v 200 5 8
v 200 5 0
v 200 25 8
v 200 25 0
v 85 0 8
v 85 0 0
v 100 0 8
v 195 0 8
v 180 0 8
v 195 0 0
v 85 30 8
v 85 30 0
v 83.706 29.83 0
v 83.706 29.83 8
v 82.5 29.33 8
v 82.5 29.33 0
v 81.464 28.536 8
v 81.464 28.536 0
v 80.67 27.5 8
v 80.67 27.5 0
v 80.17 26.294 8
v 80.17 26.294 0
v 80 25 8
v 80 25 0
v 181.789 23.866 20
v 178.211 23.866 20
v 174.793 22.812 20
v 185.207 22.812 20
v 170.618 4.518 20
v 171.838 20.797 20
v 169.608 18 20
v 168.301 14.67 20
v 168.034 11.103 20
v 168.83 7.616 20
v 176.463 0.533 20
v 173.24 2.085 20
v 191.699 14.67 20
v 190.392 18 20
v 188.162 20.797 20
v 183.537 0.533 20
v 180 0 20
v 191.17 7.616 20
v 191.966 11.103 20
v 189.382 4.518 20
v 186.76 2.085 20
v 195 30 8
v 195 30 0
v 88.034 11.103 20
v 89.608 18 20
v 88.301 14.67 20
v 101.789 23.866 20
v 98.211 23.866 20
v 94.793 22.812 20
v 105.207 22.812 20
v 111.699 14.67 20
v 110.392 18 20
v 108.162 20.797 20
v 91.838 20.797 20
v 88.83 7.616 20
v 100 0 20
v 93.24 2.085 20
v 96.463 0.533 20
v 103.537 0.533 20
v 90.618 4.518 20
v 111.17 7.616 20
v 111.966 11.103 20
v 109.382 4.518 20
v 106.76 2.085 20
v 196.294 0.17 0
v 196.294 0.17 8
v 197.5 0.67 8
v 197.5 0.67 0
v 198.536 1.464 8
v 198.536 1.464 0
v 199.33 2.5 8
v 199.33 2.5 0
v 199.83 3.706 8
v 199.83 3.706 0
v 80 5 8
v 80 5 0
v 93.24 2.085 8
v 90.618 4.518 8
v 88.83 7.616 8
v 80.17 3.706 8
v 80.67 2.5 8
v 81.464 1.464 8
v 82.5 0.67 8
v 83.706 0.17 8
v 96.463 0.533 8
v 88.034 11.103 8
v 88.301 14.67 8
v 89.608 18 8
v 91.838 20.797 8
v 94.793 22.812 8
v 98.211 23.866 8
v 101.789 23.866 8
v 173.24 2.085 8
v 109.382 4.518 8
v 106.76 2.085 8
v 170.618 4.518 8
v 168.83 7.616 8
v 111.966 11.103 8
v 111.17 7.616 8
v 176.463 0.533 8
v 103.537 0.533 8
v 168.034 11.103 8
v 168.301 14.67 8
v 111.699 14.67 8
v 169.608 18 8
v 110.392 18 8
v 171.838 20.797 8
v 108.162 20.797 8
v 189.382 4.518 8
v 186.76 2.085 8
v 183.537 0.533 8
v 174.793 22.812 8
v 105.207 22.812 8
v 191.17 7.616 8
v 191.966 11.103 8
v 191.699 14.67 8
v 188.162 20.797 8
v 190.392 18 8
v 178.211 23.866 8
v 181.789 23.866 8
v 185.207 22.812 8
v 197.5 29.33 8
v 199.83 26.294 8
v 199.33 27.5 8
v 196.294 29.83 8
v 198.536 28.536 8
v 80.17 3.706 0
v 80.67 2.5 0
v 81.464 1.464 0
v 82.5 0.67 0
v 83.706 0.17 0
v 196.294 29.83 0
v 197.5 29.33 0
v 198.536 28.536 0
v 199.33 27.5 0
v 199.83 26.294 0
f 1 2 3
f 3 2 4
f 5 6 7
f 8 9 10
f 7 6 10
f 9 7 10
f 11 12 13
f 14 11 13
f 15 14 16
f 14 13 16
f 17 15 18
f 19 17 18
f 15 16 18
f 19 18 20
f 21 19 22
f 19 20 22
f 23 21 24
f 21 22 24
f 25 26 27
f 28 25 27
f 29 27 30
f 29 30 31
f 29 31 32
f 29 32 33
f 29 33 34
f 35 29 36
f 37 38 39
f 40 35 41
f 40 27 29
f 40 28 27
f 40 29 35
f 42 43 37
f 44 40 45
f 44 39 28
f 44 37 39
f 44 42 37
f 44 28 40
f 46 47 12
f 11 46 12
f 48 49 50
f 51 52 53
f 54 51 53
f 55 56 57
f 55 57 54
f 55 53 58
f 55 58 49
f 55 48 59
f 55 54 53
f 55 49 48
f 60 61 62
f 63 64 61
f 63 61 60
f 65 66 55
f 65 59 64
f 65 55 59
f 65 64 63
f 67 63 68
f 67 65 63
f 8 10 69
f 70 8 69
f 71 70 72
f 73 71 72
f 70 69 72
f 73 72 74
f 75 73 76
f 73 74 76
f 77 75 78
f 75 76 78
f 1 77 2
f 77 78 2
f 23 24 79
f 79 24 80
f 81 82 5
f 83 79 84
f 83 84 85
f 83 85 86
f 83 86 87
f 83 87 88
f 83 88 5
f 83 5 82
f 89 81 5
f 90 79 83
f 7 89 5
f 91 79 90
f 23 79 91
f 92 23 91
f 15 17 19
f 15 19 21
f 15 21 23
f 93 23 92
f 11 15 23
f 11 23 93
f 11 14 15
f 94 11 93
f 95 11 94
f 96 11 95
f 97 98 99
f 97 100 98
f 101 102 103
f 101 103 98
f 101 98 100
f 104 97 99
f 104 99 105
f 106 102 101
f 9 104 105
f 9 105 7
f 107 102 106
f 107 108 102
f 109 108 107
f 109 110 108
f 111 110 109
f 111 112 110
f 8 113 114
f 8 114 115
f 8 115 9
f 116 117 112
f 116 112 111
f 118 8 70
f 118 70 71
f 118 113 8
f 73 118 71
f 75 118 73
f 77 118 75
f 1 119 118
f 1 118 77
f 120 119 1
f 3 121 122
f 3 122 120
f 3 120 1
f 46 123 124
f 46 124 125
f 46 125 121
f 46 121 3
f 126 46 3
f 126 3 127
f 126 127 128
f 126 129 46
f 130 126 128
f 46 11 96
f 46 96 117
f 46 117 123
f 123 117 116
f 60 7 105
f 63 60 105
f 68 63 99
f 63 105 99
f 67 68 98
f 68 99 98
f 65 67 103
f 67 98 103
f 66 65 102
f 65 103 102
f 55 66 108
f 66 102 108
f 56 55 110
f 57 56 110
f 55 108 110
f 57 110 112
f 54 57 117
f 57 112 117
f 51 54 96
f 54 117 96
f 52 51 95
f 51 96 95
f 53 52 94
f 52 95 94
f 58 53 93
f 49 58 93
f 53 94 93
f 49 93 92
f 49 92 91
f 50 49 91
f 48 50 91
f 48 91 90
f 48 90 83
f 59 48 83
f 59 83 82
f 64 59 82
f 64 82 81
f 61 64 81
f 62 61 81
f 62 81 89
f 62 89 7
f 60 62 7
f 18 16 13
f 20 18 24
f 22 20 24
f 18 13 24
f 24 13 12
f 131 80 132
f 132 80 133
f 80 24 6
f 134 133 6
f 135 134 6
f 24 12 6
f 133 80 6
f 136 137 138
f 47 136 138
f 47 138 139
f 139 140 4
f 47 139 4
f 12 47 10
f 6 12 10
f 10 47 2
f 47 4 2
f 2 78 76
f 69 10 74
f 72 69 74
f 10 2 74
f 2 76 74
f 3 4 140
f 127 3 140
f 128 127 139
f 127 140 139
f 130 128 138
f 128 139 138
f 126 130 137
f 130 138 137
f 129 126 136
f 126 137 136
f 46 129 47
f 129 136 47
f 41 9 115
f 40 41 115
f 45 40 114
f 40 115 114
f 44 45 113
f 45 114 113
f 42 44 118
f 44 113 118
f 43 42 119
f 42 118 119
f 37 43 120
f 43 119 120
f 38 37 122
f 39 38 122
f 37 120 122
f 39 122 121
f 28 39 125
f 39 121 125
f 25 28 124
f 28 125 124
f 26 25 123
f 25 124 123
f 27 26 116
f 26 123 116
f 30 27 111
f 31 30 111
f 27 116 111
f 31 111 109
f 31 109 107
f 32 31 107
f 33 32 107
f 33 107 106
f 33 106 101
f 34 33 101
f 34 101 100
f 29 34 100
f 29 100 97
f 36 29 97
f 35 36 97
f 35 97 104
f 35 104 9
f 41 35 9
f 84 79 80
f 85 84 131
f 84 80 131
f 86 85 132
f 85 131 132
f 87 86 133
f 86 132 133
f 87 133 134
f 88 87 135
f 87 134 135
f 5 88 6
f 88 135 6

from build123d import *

# Parameters (mm, degrees)
BASEPLATE_DEPTH = 8
SKETCH_4_R      = 12
PIVOTA_DEPTH    = 20
SKETCH_5_R      = 12
PIVOTD_DEPTH    = 20


with BuildPart() as part:
    # 草图3 → BasePlate (new body)
    with BuildSketch(Plane.XY):
        with BuildLine():
            Line((85, 0), (195, 0))
            ThreePointArc((195, 0), (198.535533906, 1.464466094), (200, 5))
            Line((200, 5), (200, 25))
            ThreePointArc((200, 25), (198.535533906, 28.535533906), (195, 30))
            Line((195, 30), (85, 30))
            ThreePointArc((85, 30), (81.464466094, 28.535533906), (80, 25))
            Line((80, 25), (80, 5))
            ThreePointArc((80, 5), (81.464466094, 1.464466094), (85, 0))
        make_face()
    extrude(amount=BASEPLATE_DEPTH)

    # 草图4 → PivotA (add)
    with BuildSketch(Plane.XY):
        with Locations(Location((100, 12, 0), (0, 0, 270))):
            Circle(SKETCH_4_R)
    extrude(amount=PIVOTA_DEPTH)

    # 草图5 → PivotD (add)
    with BuildSketch(Plane.XY):
        with Locations(Location((180, 12, 0), (0, 0, 270))):
            Circle(SKETCH_5_R)
    extrude(amount=PIVOTD_DEPTH)


solid = part.part
